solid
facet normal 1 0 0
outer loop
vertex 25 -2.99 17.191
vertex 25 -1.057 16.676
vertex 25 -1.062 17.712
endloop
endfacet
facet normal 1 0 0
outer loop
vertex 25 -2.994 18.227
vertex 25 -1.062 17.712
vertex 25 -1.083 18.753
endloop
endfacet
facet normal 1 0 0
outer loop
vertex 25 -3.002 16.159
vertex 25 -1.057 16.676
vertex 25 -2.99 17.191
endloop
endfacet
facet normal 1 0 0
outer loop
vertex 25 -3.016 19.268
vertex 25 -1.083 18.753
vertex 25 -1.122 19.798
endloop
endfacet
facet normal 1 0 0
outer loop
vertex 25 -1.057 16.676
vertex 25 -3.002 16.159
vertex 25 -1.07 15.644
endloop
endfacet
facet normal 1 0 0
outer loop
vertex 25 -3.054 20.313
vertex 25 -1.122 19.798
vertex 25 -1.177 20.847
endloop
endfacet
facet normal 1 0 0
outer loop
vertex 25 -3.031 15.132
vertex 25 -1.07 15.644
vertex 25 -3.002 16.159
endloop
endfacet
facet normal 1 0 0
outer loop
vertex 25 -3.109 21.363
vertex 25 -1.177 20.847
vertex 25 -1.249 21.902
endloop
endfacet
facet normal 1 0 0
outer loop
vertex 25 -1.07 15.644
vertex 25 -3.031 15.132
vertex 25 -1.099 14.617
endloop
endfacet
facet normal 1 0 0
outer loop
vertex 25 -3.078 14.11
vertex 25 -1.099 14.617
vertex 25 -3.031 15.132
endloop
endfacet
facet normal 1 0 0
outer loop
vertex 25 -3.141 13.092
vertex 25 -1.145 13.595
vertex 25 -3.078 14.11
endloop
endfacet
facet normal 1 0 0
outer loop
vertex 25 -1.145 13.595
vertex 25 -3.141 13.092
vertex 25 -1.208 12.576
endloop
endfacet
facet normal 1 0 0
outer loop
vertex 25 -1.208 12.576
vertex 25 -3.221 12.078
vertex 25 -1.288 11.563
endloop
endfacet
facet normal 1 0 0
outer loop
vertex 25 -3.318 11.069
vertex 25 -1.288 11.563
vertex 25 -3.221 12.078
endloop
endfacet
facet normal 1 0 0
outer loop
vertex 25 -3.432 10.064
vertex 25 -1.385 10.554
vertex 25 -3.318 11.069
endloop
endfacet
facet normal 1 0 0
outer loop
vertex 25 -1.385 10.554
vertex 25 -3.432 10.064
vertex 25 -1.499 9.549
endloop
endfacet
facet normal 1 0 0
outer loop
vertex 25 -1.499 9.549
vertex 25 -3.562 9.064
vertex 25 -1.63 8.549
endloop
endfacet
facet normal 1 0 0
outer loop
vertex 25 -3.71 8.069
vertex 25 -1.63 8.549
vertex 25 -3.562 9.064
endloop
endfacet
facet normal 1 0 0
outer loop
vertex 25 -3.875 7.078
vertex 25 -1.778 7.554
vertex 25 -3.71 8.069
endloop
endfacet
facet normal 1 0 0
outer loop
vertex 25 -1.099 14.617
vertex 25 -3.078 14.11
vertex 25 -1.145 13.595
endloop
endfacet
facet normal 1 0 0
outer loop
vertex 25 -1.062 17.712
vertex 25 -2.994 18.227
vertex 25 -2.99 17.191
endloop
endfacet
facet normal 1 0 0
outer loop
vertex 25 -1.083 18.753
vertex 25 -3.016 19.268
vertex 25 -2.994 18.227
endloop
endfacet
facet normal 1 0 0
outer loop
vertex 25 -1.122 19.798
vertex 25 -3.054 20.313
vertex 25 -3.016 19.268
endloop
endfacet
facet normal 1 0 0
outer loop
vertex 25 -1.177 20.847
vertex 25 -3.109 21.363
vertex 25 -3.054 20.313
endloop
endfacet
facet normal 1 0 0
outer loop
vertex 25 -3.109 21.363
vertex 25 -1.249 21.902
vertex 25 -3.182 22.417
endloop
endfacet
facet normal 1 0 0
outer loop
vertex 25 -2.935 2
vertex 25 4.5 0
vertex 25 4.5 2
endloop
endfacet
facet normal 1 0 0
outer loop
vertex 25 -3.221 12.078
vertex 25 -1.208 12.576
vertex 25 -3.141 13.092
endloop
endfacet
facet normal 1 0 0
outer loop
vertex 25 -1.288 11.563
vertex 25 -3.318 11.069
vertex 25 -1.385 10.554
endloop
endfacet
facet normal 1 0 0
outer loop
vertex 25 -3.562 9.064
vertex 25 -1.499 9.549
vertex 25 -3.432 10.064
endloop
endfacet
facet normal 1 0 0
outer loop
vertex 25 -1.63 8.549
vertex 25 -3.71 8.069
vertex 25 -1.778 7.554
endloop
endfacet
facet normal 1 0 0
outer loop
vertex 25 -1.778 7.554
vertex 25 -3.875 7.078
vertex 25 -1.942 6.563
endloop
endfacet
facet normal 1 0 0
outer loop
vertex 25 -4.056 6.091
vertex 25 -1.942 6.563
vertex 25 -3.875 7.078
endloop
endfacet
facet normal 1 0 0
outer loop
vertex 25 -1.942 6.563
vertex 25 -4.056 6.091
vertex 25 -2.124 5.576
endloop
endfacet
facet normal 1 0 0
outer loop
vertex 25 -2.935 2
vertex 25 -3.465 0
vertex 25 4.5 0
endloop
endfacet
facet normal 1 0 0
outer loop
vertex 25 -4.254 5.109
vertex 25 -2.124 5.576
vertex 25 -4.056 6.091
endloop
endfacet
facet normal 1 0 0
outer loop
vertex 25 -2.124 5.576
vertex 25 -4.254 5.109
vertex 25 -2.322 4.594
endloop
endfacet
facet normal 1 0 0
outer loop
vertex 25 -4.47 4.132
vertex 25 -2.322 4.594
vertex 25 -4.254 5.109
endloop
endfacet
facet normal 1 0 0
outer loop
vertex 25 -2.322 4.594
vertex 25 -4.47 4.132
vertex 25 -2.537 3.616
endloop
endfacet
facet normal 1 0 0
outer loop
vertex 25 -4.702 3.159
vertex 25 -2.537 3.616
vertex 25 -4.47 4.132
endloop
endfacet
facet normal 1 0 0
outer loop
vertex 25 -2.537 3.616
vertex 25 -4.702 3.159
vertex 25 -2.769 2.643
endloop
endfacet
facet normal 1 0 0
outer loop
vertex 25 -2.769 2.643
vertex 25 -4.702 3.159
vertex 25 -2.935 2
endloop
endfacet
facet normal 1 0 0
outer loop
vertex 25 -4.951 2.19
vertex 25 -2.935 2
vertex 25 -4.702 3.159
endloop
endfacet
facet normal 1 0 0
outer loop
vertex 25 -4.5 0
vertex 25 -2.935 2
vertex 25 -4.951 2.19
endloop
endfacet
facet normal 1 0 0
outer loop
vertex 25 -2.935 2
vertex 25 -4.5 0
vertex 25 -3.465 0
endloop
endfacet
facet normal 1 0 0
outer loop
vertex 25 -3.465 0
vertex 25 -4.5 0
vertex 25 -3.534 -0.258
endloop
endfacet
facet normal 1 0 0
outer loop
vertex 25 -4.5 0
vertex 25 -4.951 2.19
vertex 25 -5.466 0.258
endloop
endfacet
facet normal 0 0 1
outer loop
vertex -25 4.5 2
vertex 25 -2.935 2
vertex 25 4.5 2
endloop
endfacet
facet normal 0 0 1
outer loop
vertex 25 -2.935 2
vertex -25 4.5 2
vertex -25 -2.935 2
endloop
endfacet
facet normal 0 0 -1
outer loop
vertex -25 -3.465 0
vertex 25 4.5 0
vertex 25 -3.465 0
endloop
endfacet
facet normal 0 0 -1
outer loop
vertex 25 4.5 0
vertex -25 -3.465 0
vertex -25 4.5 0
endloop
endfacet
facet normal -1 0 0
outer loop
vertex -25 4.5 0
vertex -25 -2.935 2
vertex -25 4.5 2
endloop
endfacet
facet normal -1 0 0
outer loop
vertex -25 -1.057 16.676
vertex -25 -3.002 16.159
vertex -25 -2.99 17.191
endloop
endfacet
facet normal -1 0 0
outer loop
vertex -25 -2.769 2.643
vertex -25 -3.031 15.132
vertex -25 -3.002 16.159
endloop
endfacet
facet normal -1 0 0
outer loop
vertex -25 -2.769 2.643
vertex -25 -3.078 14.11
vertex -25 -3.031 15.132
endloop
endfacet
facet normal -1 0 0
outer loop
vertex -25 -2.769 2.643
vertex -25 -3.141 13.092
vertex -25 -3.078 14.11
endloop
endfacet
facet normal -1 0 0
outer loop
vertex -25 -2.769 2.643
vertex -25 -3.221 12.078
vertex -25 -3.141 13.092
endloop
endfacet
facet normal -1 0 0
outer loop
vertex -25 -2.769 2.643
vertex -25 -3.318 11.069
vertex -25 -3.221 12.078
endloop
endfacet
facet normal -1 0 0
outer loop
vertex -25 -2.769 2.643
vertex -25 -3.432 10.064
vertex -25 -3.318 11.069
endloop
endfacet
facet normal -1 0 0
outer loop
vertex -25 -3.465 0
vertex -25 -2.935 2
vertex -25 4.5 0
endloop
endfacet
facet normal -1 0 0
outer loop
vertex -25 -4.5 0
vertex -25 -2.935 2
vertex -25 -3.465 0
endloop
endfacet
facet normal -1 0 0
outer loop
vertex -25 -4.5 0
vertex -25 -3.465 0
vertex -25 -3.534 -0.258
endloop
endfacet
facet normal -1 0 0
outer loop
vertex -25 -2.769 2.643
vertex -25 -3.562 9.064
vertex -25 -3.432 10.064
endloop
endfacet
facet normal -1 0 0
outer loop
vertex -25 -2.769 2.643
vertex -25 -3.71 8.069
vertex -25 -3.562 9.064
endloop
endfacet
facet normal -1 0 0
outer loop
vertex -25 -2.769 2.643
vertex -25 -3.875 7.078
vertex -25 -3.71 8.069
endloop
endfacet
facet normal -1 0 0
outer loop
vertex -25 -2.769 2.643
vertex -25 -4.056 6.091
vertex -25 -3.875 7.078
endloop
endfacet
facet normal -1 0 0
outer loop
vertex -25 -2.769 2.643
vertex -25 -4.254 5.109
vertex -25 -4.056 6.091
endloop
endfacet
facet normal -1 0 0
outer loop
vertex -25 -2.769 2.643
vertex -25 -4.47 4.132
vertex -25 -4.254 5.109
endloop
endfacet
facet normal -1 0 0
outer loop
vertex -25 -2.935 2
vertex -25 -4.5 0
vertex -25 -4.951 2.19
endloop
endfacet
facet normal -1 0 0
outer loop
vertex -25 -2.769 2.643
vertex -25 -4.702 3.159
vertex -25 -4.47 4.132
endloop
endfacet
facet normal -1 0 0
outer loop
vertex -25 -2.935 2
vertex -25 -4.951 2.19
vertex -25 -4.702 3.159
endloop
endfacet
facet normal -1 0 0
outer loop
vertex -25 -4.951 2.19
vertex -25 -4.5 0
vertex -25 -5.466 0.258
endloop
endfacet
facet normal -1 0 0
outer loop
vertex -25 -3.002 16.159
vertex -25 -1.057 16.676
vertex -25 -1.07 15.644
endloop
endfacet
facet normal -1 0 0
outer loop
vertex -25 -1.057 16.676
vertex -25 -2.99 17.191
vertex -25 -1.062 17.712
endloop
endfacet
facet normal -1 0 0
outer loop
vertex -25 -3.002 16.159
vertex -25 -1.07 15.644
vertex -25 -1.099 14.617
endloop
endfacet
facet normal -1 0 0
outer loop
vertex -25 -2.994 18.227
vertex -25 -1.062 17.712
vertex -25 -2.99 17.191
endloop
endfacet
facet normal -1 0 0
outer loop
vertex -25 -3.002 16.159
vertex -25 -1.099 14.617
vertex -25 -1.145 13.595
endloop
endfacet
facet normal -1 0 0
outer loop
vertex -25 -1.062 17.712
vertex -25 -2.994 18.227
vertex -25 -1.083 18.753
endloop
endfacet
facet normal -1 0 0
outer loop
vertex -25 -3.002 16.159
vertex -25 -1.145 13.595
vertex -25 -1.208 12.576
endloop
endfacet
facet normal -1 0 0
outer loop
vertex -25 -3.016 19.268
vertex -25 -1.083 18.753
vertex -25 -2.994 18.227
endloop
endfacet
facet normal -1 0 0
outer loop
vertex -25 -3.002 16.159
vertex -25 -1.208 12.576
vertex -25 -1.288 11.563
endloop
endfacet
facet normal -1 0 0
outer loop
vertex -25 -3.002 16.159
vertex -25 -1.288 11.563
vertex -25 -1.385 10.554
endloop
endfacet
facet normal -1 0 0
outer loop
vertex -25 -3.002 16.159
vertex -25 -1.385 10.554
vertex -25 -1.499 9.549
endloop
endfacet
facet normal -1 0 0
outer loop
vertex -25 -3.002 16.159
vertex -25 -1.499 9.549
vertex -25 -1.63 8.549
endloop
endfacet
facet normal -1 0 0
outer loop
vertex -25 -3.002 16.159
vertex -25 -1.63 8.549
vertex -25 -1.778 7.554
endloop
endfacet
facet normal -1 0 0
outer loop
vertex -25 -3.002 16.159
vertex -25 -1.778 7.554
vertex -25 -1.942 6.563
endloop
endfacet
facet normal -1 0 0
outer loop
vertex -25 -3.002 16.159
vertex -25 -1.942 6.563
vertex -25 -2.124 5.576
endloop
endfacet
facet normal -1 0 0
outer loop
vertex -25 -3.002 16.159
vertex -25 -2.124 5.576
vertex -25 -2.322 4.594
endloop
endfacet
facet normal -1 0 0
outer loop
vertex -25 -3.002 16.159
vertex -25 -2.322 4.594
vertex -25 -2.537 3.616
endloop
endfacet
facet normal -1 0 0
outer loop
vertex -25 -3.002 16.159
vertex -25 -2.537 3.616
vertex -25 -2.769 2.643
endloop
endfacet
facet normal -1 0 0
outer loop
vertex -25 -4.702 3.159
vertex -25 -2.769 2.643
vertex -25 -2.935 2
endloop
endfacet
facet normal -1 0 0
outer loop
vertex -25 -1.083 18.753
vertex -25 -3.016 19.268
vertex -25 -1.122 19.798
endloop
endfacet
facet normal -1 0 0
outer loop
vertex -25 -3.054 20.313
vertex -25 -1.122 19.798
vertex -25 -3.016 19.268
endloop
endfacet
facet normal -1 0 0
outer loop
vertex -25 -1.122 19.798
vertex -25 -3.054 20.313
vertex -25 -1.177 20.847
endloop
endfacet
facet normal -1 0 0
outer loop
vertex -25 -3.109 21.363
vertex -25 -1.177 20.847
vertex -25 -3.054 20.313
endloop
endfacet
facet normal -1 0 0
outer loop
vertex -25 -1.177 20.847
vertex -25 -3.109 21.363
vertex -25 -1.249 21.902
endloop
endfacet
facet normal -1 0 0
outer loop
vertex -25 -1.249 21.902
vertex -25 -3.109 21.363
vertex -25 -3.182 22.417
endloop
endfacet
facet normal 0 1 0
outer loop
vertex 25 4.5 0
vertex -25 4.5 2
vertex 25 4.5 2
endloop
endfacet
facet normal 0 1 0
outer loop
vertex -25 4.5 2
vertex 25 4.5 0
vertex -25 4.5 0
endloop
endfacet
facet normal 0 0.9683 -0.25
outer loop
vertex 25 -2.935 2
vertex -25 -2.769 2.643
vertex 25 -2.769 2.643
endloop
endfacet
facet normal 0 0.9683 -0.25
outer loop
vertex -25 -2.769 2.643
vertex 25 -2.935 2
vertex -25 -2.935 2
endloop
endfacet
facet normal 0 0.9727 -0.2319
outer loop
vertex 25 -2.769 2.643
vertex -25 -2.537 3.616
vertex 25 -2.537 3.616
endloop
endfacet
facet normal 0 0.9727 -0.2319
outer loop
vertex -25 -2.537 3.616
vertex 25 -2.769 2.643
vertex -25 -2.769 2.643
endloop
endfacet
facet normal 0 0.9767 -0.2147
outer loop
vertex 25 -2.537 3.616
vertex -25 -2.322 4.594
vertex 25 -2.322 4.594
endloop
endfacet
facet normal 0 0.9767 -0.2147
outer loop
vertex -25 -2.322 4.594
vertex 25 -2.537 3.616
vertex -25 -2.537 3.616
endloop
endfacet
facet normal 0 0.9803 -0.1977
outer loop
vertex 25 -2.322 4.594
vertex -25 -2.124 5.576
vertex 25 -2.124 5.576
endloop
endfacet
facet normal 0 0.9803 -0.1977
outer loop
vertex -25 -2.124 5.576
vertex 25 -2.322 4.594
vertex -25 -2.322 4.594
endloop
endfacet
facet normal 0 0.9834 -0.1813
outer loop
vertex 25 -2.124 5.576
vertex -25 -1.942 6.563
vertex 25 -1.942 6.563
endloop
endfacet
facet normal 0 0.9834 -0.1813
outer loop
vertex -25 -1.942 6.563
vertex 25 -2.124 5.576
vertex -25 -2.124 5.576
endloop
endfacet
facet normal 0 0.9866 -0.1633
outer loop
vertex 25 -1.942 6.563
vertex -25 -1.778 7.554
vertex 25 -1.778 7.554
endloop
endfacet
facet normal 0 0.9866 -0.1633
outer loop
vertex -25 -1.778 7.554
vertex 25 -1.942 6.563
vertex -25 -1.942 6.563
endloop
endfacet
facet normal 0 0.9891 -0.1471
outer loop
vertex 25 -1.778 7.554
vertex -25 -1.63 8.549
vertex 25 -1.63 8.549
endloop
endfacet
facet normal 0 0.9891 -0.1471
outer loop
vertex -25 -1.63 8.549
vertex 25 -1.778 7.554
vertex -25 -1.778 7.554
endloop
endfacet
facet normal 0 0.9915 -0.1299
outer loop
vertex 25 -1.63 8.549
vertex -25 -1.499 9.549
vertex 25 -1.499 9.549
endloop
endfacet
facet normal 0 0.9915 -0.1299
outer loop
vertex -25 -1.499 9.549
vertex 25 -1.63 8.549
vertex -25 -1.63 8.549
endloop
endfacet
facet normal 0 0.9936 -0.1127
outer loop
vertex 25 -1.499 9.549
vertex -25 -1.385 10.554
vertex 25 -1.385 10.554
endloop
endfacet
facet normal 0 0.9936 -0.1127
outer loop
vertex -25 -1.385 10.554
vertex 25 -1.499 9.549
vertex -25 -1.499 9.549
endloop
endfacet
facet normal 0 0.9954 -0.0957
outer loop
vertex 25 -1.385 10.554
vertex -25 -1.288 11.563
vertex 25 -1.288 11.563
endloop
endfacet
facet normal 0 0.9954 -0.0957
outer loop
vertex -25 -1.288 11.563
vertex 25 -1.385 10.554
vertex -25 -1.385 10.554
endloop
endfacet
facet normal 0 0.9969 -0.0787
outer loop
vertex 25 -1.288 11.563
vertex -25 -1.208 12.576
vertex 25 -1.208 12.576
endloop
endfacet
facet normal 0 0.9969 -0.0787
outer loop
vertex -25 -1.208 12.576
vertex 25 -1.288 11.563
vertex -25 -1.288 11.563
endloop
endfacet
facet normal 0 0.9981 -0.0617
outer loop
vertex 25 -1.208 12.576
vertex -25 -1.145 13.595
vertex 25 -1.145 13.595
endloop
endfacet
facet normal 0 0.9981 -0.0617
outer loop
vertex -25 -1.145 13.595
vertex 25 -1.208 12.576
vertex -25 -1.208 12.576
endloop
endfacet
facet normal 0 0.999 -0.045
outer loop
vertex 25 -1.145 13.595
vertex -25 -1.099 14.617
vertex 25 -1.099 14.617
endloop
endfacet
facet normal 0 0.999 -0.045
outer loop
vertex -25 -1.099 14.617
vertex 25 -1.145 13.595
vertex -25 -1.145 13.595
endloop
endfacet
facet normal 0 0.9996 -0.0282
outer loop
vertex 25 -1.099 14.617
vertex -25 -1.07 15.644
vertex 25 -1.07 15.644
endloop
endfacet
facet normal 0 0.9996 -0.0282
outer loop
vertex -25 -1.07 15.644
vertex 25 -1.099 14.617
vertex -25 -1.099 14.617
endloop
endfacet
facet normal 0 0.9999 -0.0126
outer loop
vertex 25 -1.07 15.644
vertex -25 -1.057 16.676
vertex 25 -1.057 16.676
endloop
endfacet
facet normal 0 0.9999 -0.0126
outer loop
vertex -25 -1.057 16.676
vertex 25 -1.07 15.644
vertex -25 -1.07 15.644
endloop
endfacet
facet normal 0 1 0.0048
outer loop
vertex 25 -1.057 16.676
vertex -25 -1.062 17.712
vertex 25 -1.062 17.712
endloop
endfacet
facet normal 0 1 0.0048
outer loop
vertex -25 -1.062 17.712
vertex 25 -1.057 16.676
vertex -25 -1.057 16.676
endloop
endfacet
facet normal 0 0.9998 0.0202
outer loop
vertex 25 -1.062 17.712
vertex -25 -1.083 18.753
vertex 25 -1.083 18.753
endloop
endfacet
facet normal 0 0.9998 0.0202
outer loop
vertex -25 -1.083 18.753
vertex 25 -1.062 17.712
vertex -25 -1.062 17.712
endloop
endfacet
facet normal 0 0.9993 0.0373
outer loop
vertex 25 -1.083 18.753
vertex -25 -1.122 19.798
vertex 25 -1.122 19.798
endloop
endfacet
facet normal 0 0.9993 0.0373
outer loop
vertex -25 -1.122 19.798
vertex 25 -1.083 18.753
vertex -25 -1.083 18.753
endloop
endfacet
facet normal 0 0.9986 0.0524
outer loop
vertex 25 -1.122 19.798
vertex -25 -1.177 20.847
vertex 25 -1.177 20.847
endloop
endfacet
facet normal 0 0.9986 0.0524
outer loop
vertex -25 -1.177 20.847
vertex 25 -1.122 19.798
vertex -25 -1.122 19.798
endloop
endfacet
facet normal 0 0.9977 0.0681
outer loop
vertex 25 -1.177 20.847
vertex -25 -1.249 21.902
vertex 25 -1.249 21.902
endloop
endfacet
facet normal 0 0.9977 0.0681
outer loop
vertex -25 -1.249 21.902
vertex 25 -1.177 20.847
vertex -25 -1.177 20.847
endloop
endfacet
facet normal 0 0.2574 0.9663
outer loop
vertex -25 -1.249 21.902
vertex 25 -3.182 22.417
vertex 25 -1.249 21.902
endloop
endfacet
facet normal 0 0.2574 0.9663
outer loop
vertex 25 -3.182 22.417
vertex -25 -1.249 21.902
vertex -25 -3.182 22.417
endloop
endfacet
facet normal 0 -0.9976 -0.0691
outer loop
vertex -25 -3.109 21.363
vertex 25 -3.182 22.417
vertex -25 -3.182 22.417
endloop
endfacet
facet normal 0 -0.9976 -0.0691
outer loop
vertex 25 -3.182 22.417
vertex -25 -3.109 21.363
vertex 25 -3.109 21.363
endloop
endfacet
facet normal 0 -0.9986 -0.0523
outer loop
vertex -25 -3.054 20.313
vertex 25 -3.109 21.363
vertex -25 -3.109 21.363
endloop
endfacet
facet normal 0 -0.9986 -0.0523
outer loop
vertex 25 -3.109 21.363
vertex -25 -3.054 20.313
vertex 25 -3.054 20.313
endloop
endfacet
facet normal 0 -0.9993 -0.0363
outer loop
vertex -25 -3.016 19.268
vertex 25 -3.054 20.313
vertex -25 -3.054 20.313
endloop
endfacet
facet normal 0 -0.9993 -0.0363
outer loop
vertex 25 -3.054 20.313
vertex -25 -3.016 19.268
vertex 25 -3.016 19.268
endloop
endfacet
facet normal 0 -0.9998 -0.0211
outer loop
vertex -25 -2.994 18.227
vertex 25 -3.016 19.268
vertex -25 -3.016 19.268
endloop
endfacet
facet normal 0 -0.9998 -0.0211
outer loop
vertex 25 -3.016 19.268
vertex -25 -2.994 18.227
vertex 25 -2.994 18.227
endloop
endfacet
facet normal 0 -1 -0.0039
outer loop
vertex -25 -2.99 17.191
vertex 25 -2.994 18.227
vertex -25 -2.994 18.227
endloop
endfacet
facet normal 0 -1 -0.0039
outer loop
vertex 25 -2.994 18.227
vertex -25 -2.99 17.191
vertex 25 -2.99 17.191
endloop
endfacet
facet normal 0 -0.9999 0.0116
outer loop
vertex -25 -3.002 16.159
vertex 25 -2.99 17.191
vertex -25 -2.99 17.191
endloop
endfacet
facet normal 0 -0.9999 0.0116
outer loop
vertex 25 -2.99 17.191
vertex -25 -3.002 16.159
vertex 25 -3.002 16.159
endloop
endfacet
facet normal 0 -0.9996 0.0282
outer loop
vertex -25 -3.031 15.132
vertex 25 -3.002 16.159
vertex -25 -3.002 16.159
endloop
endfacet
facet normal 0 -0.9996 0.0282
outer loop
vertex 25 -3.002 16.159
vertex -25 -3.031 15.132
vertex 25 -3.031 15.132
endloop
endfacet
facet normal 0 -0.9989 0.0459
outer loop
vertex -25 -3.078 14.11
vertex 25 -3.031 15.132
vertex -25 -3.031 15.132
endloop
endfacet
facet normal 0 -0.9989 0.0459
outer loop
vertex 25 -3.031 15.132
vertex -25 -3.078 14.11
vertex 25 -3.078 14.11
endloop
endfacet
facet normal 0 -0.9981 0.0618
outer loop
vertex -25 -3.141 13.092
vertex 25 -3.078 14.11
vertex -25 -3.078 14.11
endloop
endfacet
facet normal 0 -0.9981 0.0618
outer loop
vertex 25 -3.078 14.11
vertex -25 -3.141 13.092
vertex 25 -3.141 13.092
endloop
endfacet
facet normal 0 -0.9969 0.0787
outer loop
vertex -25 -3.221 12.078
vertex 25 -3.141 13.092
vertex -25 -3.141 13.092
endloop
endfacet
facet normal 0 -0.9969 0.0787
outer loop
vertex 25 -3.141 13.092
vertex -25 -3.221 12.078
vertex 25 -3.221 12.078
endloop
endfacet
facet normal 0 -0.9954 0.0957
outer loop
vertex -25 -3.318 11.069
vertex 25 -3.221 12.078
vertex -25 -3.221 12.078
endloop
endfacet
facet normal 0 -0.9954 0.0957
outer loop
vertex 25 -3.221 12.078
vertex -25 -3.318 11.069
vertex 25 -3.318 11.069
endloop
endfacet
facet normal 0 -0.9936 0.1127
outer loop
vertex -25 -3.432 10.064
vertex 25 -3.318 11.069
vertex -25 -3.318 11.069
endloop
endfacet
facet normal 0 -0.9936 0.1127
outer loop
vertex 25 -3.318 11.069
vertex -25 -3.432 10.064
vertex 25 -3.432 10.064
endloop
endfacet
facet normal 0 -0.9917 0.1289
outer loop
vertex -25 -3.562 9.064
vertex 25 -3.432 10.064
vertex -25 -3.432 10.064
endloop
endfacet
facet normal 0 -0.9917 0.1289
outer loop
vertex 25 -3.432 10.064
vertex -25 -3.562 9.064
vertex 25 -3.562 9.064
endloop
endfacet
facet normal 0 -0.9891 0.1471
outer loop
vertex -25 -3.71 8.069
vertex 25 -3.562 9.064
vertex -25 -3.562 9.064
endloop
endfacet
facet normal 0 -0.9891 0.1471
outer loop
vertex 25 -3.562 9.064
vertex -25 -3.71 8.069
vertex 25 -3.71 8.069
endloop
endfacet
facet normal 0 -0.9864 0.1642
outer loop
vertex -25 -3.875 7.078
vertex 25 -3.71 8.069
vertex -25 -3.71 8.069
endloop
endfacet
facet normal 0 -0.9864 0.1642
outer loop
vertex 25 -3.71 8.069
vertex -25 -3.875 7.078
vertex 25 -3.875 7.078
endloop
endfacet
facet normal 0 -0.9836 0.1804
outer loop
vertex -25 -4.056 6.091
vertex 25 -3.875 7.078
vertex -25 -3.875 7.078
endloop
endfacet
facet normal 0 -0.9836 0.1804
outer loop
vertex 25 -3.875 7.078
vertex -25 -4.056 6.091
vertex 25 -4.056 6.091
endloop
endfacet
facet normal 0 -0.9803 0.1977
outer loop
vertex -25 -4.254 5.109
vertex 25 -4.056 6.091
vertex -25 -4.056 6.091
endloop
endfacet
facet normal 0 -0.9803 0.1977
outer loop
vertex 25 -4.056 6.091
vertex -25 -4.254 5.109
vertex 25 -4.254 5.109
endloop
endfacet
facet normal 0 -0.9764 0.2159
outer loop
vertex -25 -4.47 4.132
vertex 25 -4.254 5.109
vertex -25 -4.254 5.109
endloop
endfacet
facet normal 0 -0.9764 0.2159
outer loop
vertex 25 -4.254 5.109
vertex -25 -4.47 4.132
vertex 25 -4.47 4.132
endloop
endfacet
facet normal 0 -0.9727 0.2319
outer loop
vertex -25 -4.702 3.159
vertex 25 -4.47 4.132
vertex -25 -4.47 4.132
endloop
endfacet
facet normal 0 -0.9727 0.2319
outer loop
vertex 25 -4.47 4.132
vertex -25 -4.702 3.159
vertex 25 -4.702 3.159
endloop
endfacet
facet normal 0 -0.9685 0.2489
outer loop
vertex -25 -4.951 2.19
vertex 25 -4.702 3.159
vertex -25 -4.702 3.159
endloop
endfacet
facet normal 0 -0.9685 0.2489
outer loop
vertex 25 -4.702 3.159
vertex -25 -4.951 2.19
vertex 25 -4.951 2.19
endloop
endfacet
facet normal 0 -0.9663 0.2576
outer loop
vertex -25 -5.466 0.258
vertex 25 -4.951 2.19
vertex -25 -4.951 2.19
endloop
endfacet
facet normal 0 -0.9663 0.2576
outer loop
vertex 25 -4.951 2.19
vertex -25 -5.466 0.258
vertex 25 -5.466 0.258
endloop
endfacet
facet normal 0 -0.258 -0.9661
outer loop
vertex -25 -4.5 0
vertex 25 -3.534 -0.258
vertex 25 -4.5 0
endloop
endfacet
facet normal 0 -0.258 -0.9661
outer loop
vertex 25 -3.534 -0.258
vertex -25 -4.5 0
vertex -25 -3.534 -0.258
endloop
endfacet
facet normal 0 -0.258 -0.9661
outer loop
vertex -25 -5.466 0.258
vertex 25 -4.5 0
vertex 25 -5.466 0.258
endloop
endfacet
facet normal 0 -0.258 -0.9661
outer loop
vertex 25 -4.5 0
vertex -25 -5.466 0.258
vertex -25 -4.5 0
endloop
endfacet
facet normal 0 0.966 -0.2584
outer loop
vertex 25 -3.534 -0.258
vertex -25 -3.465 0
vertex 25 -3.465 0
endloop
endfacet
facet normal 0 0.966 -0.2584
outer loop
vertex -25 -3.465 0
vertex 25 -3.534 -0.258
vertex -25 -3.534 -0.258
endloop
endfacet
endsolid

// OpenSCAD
// Тестовая модель гибкого держателя для картона
// Паз с изогнутыми стенками (изгиб по параболе)

// Параметры
length = 50;           // длина держателя
cardboard_thickness = 2; // толщина картона
groove_top = 9;        // ширина паза вверху
groove_bottom = cardboard_thickness; // ширина паза внизу = толщина картона
wall_height = 20;      // высота стенки над основанием
wall_thickness = 2;    // толщина стенки
base_width = 9;        // ширина основания
base_thickness = 2;    // толщина основания

// Параметр изгиба (чем больше, тем более выпуклая парабола)
curve_power = 2;       // 2 = парабола, 3 = кубическая, 1 = линейная

// Количество точек для построения кривой
curve_points = 20;

// Функция для расчета изгиба стенки
// z - высота от 0 до wall_height
// возвращает расстояние от центра (внизу = groove_bottom/2, вверху = groove_top/2)
function wall_curve(z) =
    groove_bottom/2 + (groove_top/2 - groove_bottom/2) * pow(z/wall_height, curve_power);

// Модуль для создания профиля одной изогнутой стенки
module curved_wall_profile(side) {
    // side: -1 для левой стенки, +1 для правой стенки
    points_inner = [for (i = [0:curve_points])
        [wall_curve(i * wall_height / curve_points) * side,
         base_thickness + i * wall_height / curve_points]
    ];

    points_outer = [for (i = [0:curve_points])
        [(wall_curve(i * wall_height / curve_points) + wall_thickness * side) * side,
         base_thickness + i * wall_height / curve_points]
    ];

    // Создаем замкнутый контур стенки
    all_points = concat(
        [[points_inner[0][0], 0]],  // начало у основания
        points_inner,
        [points_outer[len(points_outer)-1]],  // верхняя точка
        [for (i = [len(points_outer)-1:-1:0]) points_outer[i]],
        [[points_outer[0][0], 0]]  // замыкание
    );

    polygon(all_points);
}

// Основная модель
union() {
    // Основание - параллелепипед
    translate([-length/2, -base_width/2, 0])
        cube([length, base_width, base_thickness]);

    // Одна изогнутая стенка
    // Наклоняем к центру (вычисляем угол по геометрии)
    tilt_angle = atan((groove_top/2 - groove_bottom/2) / wall_height) + 5;

    translate([-length/2, -base_width/2, 0])
        rotate([-tilt_angle, 0, 0])
            rotate([90, 0, 90])
                linear_extrude(height = length)
                    curved_wall_profile(-1);
}

// Информация для печати
echo("=== Параметры держателя ===");
echo("Длина:", length, "мм");
echo("Ширина паза вверху:", groove_top, "мм");
echo("Ширина паза внизу:", groove_bottom, "мм (= толщина картона)");
echo("Высота стенки:", wall_height, "мм");
echo("Толщина стенки:", wall_thickness, "мм");
echo("Параметр кривизны:", curve_power, "(2=парабола)");
